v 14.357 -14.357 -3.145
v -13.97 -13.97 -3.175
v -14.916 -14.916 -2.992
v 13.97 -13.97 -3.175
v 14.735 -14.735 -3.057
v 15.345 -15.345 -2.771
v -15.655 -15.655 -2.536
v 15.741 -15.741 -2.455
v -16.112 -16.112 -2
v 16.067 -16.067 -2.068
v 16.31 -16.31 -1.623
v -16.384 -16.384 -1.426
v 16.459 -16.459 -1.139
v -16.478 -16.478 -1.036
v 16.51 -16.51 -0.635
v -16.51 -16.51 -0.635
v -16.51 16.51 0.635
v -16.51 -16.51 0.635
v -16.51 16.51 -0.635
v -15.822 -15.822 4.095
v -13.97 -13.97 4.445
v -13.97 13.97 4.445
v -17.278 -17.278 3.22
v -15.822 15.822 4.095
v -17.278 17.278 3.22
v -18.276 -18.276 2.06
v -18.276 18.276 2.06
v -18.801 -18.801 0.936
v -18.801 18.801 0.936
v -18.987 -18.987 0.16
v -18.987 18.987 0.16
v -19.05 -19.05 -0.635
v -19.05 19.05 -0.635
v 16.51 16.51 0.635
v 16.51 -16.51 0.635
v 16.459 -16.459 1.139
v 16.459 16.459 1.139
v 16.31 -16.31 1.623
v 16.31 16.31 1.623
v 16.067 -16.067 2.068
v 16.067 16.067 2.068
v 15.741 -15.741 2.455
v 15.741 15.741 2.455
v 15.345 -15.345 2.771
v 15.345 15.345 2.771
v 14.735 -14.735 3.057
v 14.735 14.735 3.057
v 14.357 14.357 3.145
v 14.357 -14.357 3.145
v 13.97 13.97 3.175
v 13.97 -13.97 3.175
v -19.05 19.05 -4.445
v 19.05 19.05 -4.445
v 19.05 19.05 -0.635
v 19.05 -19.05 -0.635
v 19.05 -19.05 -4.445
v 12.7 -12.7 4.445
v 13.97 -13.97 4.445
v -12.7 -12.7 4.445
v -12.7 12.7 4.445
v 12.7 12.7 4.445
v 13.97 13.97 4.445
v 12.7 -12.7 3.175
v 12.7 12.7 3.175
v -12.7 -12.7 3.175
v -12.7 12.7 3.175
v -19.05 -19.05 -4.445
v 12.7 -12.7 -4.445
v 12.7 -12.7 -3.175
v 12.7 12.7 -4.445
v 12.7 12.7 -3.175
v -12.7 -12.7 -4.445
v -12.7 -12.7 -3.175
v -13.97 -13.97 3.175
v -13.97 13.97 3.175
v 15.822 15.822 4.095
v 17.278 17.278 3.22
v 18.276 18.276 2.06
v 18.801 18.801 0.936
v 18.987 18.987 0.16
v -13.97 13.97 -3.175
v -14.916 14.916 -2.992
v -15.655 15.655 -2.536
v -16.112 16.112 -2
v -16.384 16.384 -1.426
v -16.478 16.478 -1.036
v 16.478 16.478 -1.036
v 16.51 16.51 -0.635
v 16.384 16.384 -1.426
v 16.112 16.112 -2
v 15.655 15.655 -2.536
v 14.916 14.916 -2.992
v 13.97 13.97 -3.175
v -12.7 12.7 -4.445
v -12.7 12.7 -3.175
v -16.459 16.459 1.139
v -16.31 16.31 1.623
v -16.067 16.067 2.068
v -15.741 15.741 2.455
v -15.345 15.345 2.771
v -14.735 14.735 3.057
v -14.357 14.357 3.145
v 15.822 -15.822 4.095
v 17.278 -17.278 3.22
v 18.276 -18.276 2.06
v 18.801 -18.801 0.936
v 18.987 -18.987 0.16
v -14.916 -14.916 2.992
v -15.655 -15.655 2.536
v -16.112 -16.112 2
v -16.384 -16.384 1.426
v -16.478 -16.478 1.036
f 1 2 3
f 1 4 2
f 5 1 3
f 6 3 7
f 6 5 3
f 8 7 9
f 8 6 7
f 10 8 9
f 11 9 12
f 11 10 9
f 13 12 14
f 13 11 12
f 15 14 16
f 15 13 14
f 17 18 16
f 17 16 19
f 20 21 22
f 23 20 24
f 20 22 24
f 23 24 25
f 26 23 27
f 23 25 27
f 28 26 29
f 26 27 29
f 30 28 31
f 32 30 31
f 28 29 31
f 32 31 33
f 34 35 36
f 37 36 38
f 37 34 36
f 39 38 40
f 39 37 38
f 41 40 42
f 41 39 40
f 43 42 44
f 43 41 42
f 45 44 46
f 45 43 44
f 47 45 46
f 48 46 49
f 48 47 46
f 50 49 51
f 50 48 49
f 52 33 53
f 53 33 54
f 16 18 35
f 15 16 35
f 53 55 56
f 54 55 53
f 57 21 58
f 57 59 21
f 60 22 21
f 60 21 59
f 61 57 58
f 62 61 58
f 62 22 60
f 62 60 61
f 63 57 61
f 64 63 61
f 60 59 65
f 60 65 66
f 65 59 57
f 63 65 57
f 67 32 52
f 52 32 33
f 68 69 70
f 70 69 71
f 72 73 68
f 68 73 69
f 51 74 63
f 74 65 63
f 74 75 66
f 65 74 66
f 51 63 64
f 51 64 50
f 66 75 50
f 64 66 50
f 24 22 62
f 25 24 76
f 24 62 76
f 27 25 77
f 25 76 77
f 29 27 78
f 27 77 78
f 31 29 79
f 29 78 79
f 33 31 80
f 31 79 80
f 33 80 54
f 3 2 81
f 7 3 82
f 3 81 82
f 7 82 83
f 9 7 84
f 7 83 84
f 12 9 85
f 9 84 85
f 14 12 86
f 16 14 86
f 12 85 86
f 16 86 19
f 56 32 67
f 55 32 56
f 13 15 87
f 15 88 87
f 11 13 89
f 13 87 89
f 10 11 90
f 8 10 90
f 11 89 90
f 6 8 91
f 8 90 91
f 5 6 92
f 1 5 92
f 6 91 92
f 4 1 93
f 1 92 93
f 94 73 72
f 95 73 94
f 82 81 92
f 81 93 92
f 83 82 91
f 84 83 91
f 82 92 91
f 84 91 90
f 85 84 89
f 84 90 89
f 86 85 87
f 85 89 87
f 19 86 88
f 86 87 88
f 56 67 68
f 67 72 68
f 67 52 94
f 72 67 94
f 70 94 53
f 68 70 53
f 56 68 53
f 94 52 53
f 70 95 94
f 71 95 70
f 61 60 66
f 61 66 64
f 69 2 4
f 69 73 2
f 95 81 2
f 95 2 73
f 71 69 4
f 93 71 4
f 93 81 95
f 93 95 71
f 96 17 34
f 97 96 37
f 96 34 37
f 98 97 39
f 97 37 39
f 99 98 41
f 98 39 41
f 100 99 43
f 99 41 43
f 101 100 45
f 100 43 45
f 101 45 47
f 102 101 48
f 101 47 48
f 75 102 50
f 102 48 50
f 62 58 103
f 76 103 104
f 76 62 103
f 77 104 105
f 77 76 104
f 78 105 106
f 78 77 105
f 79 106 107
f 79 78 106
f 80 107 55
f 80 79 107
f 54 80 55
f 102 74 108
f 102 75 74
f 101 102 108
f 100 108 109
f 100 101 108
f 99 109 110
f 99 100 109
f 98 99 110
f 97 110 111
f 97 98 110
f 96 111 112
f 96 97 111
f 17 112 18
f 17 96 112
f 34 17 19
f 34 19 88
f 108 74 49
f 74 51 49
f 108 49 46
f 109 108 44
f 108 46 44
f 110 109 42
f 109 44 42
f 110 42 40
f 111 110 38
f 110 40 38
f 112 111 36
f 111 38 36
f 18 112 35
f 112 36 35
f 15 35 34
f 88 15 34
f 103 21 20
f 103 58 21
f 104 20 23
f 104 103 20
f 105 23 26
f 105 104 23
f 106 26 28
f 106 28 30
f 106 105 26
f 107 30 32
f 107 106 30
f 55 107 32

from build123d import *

# Parameters (mm, degrees)
F0_W          = 38.1
F0_H          = 38.1
F0_W_2        = 33.02
F0_H_2        = 33.02
F0_W_3        = 25.4
F0_H_3        = 25.4
F1_DEPTH      = 4.445
F1_DEPTH_BACK = 4.445
F2_DEPTH      = 3.175
F2_DEPTH_BACK = 3.175
F3_R          = 2.54
F4_R          = 2.54
F5_R          = 5.08


with BuildPart() as f1:
    # F0 (on Top) → F1 (new body, two sides)
    with BuildSketch(Plane.XY) as f1_sk:
        Rectangle(F0_W, F0_H)
        Rectangle(F0_W_2, F0_H_2, mode=Mode.SUBTRACT)
        Rectangle(F0_W_2, F0_H_2)
        Rectangle(F0_W_3, F0_H_3, mode=Mode.SUBTRACT)
    extrude(amount=F1_DEPTH)
    extrude(f1_sk.sketch, amount=-F1_DEPTH_BACK)

    # F0 (on Top) → F2 (cut, two sides)
    with BuildSketch(Plane.XY) as f2_sk:
        Rectangle(F0_W_2, F0_H_2)
        Rectangle(F0_W_3, F0_H_3, mode=Mode.SUBTRACT)
    extrude(amount=F2_DEPTH, mode=Mode.SUBTRACT)
    extrude(f2_sk.sketch, amount=-F2_DEPTH_BACK, mode=Mode.SUBTRACT)

    # F3
    f3_edges = [f1.edges().sort_by_distance(p)[0] for p in [
        (-16.51, 0, -3.175),
        (0, 16.51, -3.175),
        (16.51, 0, -3.175),
        (0, -16.51, -3.175),
    ]]
    fillet(f3_edges, radius=F3_R)

    # F4
    f4_edges = [f1.edges().sort_by_distance(p)[0] for p in [
        (0, 16.51, 3.175),
        (16.51, 0, 3.175),
        (0, -16.51, 3.175),
        (-16.51, 0, 3.175),
    ]]
    fillet(f4_edges, radius=F4_R)

    # F5
    f5_edges = [f1.edges().sort_by_distance(p)[0] for p in [
        (19.05, 0, 4.445),
        (0, 19.05, 4.445),
        (-19.05, 0, 4.445),
        (0, -19.05, 4.445),
    ]]
    fillet(f5_edges, radius=F5_R)


solid = f1.part
